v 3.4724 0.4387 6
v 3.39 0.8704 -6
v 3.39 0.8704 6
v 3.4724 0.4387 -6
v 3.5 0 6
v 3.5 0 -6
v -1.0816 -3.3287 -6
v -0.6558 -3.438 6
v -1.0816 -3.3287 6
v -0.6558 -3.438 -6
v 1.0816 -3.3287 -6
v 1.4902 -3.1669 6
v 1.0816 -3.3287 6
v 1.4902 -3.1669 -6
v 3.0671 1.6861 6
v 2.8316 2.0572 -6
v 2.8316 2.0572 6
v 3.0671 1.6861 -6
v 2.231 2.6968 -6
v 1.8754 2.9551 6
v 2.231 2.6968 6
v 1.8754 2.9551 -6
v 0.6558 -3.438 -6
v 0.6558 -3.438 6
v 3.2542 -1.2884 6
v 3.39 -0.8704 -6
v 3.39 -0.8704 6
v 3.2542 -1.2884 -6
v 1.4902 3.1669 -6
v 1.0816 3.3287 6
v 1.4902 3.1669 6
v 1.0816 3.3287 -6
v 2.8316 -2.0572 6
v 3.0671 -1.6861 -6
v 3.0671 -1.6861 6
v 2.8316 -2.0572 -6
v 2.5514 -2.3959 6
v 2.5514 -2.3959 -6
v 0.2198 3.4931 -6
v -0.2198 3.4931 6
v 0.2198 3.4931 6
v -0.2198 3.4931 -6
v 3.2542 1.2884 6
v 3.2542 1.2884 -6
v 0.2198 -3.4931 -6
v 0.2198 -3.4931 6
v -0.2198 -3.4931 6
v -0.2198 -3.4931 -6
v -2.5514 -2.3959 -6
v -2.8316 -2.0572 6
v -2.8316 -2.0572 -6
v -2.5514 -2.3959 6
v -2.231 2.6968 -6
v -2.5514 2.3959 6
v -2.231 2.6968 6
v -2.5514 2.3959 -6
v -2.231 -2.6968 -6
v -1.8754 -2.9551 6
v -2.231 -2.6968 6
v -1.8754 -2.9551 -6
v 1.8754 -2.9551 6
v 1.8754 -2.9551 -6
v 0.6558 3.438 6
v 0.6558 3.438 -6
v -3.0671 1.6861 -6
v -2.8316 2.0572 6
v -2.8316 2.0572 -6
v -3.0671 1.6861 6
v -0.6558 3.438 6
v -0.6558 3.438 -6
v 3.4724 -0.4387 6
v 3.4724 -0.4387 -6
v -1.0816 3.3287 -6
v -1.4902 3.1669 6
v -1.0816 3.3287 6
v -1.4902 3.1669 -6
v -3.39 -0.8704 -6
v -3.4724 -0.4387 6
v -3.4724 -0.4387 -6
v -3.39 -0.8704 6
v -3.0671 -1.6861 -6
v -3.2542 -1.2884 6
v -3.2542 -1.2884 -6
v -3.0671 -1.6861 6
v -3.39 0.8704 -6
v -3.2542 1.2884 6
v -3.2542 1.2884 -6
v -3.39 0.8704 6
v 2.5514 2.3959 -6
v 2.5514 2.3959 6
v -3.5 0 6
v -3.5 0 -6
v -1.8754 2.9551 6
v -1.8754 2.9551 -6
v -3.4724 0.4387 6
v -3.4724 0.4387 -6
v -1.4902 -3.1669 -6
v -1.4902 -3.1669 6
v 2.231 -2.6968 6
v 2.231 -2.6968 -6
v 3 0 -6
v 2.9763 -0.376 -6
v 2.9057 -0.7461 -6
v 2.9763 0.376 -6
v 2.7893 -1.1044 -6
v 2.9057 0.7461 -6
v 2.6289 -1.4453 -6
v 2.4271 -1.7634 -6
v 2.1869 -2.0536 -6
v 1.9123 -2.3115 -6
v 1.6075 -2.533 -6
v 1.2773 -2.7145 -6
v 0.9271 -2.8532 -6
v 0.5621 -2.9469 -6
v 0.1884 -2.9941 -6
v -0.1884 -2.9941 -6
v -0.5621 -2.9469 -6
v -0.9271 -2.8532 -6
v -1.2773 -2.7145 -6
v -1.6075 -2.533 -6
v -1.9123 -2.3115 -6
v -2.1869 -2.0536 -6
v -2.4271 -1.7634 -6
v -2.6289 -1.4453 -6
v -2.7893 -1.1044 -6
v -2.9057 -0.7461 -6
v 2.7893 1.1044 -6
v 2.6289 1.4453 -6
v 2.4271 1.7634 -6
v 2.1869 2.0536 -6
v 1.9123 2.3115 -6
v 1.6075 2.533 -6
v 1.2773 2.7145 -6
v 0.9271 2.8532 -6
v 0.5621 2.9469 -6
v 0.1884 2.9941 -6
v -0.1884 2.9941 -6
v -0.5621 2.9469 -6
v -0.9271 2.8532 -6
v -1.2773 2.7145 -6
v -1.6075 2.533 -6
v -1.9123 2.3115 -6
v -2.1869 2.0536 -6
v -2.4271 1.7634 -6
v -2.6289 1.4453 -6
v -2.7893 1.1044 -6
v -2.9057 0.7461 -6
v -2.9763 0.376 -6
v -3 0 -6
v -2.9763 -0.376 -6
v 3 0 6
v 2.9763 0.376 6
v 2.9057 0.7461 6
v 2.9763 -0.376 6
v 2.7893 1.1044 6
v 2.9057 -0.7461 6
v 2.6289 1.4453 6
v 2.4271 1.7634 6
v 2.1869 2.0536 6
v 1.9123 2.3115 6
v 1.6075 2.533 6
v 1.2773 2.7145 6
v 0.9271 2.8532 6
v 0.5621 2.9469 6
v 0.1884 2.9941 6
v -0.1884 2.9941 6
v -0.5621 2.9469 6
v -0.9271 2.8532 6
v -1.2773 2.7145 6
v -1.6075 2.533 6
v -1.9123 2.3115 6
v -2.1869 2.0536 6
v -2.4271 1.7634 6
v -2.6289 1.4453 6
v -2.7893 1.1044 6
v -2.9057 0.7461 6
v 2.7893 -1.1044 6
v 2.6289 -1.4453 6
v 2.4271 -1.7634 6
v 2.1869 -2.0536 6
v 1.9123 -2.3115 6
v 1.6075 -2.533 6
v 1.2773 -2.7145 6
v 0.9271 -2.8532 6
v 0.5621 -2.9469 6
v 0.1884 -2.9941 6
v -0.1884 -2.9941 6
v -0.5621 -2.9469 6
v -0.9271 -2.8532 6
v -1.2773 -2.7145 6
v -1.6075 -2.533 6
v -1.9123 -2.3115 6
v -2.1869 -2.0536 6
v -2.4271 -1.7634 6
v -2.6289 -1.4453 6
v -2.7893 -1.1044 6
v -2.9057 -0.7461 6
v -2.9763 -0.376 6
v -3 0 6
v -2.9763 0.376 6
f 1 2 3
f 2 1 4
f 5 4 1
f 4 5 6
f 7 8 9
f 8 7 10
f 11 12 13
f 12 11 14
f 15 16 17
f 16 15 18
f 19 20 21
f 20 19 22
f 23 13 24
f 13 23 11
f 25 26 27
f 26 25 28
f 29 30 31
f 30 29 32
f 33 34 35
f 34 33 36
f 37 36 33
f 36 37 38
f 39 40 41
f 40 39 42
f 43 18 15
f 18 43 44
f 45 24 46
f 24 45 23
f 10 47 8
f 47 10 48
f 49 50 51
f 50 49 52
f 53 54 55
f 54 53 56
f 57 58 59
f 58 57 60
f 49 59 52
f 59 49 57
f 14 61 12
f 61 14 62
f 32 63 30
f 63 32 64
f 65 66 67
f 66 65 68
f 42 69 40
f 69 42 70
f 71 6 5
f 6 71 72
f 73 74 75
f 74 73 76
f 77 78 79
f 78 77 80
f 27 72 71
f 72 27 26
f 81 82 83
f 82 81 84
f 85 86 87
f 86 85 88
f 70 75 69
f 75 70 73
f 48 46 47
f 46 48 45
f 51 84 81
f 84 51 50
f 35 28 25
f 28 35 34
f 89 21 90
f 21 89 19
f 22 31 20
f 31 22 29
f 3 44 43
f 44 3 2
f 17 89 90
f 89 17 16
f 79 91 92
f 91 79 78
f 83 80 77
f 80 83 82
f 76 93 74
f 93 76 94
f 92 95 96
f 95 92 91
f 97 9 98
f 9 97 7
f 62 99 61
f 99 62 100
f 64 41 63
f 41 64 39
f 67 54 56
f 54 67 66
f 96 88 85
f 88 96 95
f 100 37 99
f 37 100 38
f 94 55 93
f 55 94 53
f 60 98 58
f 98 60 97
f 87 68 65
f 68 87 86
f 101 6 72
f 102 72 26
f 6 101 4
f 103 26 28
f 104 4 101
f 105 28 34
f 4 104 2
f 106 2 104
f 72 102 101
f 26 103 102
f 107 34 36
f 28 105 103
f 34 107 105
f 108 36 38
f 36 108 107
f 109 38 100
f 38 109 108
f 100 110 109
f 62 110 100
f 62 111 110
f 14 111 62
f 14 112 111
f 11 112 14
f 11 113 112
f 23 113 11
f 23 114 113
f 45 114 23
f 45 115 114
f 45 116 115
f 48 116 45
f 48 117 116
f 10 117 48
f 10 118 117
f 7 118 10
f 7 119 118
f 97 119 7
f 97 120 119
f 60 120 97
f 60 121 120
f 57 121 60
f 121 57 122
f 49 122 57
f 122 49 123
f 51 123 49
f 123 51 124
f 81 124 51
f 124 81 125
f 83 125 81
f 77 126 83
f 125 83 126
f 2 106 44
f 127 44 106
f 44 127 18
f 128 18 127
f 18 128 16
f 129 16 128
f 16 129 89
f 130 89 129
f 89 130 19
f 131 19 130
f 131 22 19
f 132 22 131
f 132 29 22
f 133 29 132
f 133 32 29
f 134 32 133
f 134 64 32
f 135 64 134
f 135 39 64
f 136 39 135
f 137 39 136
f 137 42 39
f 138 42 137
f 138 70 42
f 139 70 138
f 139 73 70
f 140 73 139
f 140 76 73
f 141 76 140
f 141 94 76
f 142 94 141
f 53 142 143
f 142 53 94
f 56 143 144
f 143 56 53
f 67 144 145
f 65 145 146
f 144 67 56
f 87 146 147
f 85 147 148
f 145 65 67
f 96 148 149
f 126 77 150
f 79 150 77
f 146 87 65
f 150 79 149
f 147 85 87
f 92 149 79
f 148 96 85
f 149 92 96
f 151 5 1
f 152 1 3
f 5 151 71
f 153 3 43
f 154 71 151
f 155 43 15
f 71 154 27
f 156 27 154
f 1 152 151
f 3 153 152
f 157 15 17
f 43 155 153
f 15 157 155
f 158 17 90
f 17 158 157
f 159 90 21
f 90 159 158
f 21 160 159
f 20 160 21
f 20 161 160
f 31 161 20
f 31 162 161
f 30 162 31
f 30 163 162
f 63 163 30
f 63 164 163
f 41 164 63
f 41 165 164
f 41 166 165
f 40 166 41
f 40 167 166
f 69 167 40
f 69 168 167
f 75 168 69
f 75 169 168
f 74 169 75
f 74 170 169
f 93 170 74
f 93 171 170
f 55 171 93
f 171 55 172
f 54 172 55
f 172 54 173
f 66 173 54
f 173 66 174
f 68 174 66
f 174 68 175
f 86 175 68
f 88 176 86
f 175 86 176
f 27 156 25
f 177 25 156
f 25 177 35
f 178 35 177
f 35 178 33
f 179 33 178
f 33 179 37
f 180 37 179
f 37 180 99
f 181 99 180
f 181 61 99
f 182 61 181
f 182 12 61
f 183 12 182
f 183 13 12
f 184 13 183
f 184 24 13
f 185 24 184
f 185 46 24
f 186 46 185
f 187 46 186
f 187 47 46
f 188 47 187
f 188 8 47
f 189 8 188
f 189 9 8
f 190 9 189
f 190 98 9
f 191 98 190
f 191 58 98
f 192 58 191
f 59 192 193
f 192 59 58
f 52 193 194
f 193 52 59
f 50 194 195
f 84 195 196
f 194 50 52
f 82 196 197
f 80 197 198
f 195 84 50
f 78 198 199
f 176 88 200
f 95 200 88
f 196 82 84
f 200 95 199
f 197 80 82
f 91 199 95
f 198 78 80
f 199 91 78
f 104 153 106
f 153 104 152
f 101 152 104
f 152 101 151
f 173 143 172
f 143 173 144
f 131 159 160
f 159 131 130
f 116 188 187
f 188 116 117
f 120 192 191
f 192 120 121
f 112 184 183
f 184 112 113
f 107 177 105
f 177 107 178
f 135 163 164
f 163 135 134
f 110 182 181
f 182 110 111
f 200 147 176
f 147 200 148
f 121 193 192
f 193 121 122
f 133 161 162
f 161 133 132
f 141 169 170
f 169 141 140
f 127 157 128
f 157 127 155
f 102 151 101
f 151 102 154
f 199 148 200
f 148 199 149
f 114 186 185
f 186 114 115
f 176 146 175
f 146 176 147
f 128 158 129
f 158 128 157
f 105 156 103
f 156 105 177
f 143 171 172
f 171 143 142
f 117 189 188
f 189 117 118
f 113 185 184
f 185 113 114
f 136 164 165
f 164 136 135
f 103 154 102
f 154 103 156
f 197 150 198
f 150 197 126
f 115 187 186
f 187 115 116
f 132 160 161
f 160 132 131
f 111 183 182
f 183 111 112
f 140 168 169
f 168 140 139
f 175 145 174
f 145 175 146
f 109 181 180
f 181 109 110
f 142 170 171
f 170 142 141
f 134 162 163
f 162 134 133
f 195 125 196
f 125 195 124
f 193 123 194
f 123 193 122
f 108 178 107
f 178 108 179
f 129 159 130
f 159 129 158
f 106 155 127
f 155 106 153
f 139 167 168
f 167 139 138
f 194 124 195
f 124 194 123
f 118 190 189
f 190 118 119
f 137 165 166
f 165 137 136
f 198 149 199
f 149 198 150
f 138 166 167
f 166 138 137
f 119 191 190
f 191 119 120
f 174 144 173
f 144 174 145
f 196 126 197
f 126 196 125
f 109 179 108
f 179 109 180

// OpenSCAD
$fn = 50;


difference() {
	union() {
		translate(v = [0, 0, -6.0000000000]) {
			cylinder(h = 12, r = 3.5000000000);
		}
	}
	union() {
		translate(v = [0, 0, -100.0000000000]) {
			cylinder(h = 200, r = 3.0000000000);
		}
	}
}
